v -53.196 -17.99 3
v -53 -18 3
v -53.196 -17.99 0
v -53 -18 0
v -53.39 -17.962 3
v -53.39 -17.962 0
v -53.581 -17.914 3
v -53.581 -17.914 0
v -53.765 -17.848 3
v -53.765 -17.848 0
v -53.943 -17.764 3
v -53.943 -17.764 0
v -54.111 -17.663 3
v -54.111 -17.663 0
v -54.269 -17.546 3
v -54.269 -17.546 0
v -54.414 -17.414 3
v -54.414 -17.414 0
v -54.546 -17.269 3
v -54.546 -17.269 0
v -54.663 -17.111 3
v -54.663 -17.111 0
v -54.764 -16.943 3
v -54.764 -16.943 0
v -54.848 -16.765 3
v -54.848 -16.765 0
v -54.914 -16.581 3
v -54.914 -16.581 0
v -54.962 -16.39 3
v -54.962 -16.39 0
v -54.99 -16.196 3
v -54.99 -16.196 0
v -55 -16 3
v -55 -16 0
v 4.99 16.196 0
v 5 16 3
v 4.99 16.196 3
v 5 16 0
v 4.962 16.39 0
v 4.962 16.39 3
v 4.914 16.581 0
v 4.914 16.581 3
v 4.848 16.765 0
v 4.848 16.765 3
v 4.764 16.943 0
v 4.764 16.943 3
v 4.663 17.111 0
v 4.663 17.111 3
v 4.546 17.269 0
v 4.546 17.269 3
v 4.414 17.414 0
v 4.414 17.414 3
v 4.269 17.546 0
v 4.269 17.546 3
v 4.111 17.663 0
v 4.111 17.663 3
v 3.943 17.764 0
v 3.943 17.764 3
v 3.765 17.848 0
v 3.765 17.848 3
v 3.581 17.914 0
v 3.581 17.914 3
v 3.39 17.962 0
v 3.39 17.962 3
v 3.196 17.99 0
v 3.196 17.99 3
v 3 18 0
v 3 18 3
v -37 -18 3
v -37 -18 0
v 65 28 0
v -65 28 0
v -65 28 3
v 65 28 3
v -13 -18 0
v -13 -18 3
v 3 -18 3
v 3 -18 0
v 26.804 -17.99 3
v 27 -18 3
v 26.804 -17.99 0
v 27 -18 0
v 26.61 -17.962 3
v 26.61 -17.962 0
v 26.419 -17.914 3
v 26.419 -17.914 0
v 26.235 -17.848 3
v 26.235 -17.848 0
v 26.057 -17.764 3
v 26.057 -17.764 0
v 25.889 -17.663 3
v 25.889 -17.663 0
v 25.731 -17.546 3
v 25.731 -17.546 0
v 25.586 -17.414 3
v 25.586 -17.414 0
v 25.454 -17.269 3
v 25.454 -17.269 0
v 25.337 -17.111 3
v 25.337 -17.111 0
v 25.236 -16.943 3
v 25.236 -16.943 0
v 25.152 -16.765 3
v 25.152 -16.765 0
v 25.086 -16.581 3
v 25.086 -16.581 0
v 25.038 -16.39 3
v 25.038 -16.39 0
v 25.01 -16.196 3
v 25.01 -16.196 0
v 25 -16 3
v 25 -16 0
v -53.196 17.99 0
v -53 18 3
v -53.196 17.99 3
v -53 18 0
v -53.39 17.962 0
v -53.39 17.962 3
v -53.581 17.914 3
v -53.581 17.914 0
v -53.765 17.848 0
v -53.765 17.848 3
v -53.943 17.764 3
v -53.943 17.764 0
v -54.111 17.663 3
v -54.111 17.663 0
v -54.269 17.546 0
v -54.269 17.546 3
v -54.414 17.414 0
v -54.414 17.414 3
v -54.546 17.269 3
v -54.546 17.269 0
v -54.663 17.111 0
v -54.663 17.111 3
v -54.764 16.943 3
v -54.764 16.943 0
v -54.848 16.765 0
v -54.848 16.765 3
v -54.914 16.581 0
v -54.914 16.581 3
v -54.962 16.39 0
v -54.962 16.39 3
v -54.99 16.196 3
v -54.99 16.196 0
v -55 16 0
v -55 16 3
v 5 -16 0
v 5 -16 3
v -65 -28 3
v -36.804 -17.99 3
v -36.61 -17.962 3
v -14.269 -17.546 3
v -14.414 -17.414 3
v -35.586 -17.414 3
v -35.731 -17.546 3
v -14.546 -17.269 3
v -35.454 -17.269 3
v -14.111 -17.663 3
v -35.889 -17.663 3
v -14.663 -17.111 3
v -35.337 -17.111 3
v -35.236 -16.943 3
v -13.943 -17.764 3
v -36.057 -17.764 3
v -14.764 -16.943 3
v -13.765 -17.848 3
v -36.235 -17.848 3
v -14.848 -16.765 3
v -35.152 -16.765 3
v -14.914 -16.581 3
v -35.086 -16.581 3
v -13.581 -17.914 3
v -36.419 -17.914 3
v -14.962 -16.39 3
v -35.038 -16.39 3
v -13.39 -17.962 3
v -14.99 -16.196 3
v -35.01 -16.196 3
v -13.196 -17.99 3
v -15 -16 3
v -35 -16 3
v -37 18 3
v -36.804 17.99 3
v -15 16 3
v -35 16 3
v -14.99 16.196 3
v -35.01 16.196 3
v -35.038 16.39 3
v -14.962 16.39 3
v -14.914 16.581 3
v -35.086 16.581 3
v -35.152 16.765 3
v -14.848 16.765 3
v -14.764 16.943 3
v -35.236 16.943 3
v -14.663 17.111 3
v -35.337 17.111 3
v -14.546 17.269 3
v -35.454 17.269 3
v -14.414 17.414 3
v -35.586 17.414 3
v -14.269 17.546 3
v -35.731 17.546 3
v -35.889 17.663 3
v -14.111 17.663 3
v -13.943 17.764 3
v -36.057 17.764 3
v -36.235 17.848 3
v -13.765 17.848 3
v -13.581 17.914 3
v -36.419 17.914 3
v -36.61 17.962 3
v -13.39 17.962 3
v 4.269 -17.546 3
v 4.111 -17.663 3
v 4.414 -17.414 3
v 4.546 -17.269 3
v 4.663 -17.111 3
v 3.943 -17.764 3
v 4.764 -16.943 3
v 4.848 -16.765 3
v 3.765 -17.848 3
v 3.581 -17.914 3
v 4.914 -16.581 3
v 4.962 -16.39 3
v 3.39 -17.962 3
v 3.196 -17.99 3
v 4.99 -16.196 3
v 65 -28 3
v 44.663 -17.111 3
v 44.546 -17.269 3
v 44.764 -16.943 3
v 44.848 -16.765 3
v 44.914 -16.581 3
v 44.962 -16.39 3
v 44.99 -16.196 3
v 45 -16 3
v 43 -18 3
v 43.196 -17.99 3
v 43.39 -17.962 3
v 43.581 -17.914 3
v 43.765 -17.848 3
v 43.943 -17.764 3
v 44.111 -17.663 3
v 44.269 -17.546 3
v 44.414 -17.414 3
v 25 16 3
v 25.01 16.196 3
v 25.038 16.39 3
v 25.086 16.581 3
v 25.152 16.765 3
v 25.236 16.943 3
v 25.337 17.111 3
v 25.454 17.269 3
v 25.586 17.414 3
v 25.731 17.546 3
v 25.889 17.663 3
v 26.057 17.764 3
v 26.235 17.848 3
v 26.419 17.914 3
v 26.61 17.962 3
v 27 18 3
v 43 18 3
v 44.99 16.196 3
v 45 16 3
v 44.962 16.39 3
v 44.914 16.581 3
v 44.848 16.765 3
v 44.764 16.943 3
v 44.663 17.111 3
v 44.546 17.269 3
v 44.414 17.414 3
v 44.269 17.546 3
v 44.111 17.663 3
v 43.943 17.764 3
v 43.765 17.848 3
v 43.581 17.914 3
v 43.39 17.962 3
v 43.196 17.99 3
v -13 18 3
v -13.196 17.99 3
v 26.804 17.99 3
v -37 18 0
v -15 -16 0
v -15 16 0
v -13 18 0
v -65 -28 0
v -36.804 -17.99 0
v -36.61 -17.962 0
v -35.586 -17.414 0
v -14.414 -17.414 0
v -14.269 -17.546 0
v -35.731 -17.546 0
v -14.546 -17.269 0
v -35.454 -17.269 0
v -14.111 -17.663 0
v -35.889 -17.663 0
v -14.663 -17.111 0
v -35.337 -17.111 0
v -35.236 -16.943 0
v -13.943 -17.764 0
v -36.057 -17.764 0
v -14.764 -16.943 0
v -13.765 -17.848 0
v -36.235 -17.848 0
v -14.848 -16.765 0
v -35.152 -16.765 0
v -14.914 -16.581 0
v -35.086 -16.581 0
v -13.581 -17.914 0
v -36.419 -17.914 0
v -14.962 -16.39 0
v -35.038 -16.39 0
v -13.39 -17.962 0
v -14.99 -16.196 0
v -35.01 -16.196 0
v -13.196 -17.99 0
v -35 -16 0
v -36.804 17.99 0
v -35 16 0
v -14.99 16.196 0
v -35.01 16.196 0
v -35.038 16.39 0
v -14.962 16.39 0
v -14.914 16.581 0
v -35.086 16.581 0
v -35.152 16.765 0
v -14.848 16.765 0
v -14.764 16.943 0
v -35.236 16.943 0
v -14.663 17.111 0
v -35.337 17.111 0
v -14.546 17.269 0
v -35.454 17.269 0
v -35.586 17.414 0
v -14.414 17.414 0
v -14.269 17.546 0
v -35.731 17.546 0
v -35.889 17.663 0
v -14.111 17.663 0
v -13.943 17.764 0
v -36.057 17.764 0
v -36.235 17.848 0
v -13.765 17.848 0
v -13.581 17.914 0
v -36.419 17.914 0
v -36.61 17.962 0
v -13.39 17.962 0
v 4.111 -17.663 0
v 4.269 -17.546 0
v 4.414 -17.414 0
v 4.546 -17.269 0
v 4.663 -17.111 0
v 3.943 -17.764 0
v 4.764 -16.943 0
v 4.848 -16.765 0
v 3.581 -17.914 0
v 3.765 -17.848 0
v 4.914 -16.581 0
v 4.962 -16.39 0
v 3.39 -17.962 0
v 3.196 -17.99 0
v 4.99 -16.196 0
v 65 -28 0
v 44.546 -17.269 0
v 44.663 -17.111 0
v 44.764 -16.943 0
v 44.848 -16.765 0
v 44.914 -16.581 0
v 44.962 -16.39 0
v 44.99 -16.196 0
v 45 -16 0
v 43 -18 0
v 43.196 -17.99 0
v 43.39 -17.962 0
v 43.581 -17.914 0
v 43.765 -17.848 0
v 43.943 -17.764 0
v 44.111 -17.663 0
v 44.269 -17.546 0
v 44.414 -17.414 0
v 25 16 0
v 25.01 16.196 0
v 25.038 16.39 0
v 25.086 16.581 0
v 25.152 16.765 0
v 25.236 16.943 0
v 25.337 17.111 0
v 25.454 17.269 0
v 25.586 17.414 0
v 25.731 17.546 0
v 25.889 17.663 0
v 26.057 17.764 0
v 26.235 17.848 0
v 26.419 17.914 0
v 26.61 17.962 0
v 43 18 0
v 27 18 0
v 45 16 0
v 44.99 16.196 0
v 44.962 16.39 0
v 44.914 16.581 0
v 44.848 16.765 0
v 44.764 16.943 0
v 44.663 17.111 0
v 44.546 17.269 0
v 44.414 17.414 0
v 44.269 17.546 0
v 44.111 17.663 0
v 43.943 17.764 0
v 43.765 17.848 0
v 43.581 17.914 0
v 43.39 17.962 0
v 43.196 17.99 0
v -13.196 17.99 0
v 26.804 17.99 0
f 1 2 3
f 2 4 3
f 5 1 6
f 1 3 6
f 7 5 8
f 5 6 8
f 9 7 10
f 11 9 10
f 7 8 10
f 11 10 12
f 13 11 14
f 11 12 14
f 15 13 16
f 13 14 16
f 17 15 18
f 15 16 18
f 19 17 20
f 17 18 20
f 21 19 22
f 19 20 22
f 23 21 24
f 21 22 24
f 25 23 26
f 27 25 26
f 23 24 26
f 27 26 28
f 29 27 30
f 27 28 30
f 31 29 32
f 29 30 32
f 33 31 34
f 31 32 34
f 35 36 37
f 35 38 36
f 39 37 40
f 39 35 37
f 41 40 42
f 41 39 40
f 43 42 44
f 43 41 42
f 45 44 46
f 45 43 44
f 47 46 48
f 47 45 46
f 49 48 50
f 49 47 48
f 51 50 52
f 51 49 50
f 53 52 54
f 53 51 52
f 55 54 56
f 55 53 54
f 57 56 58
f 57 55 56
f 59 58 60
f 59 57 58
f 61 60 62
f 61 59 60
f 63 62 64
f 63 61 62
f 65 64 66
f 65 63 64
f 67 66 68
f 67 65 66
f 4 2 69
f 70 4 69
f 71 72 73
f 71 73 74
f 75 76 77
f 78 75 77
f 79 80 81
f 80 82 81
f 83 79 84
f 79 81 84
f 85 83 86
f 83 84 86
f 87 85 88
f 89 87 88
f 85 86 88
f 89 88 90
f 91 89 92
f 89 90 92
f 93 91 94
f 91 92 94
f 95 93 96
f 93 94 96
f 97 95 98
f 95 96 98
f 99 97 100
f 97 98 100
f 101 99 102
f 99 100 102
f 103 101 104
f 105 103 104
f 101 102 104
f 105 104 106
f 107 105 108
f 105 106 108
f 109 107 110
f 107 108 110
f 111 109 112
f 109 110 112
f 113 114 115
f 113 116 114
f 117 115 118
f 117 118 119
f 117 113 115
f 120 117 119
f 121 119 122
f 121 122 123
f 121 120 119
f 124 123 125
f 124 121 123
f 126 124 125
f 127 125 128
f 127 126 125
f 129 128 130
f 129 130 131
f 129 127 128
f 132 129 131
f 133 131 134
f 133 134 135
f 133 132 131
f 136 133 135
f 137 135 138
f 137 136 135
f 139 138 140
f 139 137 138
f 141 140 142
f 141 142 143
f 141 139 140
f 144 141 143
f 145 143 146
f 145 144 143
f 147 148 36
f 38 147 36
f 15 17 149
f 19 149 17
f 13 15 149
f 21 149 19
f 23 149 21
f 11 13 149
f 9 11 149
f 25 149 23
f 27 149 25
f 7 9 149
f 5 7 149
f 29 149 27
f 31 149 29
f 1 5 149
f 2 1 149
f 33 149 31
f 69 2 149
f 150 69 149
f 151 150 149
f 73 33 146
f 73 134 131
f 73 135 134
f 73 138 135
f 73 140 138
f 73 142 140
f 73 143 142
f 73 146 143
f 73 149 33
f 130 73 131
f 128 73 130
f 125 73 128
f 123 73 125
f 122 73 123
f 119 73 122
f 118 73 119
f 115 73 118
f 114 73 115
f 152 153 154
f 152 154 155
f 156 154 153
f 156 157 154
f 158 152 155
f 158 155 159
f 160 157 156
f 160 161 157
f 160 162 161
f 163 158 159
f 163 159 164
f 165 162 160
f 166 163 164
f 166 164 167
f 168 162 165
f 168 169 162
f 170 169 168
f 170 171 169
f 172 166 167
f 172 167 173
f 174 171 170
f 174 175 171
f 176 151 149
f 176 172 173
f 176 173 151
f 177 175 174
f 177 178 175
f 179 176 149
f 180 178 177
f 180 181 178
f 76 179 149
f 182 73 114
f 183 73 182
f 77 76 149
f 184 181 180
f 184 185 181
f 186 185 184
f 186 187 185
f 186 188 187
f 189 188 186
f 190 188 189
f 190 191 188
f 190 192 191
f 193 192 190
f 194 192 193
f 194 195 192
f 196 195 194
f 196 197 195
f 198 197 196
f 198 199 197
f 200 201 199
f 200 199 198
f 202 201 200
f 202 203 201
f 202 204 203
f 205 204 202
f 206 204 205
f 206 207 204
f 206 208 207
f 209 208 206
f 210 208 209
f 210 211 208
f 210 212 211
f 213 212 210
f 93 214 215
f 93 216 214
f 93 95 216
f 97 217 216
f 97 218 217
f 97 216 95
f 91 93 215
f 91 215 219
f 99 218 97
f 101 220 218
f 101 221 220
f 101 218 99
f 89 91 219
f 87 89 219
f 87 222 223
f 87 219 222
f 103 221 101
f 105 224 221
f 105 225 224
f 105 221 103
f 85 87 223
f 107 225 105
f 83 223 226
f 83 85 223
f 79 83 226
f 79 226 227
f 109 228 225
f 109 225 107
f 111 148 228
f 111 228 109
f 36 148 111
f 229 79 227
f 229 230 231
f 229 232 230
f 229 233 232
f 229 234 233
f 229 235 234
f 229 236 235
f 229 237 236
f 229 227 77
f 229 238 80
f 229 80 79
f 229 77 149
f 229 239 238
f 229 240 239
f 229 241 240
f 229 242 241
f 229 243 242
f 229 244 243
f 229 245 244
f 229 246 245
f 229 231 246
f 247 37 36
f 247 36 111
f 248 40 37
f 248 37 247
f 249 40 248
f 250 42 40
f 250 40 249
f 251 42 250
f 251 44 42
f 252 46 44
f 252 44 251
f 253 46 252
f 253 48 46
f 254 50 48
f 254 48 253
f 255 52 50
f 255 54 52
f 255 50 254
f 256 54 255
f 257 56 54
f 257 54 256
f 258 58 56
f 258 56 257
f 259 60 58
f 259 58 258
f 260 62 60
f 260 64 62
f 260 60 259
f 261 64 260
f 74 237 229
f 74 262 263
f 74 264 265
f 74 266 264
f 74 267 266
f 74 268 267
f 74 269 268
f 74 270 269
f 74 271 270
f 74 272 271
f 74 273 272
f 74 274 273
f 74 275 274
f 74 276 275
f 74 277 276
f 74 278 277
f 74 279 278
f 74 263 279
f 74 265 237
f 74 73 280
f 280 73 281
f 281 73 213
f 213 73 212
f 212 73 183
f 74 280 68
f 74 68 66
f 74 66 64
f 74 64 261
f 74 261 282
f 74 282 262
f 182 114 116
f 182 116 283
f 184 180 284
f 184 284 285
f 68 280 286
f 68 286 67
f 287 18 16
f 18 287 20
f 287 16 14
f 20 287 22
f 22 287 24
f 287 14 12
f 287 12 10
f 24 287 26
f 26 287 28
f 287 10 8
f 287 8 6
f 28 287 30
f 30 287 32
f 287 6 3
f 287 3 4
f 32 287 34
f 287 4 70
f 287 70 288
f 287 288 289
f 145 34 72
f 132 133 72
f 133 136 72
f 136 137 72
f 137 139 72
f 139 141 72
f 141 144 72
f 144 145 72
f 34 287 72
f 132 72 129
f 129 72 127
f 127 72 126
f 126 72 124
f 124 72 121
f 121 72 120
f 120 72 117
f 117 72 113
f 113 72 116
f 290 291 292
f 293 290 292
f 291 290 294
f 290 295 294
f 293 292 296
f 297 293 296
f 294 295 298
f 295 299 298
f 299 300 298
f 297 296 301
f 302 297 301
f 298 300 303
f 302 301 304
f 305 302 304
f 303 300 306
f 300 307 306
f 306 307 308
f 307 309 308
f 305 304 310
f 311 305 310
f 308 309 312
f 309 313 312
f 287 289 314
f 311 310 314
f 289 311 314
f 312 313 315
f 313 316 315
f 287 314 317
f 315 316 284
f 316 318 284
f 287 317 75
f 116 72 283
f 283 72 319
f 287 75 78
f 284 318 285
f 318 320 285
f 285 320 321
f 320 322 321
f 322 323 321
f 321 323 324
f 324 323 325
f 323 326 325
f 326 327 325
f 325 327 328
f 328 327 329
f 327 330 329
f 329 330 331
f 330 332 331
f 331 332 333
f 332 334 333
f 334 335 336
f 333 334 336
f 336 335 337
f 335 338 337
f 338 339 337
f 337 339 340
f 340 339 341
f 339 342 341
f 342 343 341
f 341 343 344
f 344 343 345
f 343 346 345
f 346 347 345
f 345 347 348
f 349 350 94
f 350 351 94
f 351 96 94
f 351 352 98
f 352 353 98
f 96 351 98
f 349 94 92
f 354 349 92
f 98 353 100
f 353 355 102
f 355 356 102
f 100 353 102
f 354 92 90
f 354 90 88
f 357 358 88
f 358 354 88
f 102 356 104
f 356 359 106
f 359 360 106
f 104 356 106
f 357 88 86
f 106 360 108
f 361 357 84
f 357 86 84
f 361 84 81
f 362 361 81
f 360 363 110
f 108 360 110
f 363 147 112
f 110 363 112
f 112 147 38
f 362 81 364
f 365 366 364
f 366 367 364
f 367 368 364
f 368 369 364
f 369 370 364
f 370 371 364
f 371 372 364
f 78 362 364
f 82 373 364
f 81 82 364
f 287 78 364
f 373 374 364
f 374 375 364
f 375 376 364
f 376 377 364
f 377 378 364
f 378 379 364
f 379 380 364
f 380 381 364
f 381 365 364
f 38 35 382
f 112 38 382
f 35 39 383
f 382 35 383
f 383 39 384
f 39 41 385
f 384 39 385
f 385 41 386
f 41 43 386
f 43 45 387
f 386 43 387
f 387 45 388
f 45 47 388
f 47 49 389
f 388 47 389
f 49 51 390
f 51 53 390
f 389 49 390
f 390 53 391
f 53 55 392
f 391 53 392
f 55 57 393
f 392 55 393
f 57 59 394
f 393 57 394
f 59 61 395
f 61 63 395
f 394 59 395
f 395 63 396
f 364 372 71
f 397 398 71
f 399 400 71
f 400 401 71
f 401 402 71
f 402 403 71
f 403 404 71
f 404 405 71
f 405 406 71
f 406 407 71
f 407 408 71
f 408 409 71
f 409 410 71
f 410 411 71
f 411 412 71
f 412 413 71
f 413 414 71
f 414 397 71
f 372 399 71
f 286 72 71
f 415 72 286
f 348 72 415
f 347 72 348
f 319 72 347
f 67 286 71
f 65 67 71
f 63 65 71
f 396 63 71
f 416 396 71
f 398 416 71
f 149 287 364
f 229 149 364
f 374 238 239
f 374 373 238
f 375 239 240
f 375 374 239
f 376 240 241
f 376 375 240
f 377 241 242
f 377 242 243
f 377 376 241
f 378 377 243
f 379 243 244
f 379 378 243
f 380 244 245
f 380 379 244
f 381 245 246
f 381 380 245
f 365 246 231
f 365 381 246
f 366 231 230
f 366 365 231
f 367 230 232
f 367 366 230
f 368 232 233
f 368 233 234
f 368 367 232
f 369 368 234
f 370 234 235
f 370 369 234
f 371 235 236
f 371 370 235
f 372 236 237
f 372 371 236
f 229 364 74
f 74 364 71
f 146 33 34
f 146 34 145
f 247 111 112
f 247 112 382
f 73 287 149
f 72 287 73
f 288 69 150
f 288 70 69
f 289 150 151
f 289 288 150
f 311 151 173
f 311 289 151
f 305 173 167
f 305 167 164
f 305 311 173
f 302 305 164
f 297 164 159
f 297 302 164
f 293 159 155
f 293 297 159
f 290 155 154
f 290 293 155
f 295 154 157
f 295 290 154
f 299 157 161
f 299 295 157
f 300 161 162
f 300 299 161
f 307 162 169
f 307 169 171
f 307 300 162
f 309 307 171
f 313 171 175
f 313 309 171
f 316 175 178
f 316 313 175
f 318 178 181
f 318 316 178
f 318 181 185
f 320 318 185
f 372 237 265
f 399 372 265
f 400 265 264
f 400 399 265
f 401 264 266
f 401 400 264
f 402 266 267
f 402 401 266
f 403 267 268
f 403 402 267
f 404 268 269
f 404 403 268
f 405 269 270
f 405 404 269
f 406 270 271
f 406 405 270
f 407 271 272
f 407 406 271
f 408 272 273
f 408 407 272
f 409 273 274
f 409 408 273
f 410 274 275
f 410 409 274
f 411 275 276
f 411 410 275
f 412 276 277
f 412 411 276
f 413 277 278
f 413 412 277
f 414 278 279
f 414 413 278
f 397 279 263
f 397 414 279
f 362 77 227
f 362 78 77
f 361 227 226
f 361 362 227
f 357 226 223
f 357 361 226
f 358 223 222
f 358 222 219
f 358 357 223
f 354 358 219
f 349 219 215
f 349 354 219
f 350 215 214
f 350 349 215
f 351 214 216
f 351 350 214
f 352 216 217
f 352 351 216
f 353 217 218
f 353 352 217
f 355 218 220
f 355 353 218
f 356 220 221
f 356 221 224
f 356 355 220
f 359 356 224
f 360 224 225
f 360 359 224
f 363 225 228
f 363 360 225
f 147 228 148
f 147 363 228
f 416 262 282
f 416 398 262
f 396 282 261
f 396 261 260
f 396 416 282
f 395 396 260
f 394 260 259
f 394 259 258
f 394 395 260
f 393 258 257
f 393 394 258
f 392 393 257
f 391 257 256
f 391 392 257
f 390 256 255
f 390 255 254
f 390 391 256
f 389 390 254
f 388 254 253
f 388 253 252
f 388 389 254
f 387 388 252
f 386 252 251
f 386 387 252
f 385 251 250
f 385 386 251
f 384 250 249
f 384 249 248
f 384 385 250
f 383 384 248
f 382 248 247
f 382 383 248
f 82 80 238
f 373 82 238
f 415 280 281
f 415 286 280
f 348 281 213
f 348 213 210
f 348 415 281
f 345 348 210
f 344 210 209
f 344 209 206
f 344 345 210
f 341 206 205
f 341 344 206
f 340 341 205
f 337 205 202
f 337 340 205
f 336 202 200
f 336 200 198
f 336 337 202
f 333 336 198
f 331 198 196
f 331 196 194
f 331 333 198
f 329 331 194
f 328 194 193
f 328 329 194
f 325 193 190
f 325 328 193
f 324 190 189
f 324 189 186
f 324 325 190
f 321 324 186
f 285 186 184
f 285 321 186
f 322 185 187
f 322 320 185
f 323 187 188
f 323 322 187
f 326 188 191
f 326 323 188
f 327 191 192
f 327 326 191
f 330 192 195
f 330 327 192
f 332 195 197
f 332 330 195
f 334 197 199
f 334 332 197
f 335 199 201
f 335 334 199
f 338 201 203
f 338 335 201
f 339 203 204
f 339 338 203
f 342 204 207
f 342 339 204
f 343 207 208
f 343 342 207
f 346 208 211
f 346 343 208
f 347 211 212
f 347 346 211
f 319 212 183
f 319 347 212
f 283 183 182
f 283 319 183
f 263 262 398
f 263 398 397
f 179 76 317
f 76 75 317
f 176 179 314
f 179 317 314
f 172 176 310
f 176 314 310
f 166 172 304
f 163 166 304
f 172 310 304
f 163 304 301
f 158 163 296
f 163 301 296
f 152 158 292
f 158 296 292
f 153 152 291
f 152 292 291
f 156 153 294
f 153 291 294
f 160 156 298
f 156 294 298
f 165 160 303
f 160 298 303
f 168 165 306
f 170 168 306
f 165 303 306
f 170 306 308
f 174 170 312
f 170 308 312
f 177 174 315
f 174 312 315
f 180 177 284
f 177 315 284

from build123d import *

# Parameters (mm, degrees)
SKETCH1_W           = 130
SKETCH1_H           = 56
BOSS_EXTRUDE1_DEPTH = 3
SKETCH2_W           = 20
SKETCH2_H           = 36
CUT_EXTRUDE1_DEPTH  = 5
FILLET1_R           = 2


with BuildPart() as part:
    # Sketch1 → Boss-Extrude1 (new body)
    with BuildSketch(Plane.XY):
        Rectangle(SKETCH1_W, SKETCH1_H)
    extrude(amount=BOSS_EXTRUDE1_DEPTH)

    # Sketch2 → Cut-Extrude1 (cut)
    with BuildSketch(Plane.XY.offset(3)):
        with Locations((35, 0)):
            Rectangle(SKETCH2_W, SKETCH2_H)
        with Locations((-5, 0)):
            Rectangle(SKETCH2_W, SKETCH2_H)
        with Locations((-45, 0)):
            Rectangle(SKETCH2_W, SKETCH2_H)
    extrude(amount=-CUT_EXTRUDE1_DEPTH, mode=Mode.SUBTRACT)

    # Fillet1
    fillet1_edges = [part.edges().sort_by_distance(p)[0] for p in [
        (5, -18, 1.5),
        (-15, -18, 1.5),
        (-15, 18, 1.5),
        (5, 18, 1.5),
        (-55, 18, 1.5),
        (-35, 18, 1.5),
        (-35, -18, 1.5),
        (-55, -18, 1.5),
        (25, 18, 1.5),
        (45, 18, 1.5),
        (45, -18, 1.5),
        (25, -18, 1.5),
    ]]
    fillet(fillet1_edges, radius=FILLET1_R)


solid = part.part
